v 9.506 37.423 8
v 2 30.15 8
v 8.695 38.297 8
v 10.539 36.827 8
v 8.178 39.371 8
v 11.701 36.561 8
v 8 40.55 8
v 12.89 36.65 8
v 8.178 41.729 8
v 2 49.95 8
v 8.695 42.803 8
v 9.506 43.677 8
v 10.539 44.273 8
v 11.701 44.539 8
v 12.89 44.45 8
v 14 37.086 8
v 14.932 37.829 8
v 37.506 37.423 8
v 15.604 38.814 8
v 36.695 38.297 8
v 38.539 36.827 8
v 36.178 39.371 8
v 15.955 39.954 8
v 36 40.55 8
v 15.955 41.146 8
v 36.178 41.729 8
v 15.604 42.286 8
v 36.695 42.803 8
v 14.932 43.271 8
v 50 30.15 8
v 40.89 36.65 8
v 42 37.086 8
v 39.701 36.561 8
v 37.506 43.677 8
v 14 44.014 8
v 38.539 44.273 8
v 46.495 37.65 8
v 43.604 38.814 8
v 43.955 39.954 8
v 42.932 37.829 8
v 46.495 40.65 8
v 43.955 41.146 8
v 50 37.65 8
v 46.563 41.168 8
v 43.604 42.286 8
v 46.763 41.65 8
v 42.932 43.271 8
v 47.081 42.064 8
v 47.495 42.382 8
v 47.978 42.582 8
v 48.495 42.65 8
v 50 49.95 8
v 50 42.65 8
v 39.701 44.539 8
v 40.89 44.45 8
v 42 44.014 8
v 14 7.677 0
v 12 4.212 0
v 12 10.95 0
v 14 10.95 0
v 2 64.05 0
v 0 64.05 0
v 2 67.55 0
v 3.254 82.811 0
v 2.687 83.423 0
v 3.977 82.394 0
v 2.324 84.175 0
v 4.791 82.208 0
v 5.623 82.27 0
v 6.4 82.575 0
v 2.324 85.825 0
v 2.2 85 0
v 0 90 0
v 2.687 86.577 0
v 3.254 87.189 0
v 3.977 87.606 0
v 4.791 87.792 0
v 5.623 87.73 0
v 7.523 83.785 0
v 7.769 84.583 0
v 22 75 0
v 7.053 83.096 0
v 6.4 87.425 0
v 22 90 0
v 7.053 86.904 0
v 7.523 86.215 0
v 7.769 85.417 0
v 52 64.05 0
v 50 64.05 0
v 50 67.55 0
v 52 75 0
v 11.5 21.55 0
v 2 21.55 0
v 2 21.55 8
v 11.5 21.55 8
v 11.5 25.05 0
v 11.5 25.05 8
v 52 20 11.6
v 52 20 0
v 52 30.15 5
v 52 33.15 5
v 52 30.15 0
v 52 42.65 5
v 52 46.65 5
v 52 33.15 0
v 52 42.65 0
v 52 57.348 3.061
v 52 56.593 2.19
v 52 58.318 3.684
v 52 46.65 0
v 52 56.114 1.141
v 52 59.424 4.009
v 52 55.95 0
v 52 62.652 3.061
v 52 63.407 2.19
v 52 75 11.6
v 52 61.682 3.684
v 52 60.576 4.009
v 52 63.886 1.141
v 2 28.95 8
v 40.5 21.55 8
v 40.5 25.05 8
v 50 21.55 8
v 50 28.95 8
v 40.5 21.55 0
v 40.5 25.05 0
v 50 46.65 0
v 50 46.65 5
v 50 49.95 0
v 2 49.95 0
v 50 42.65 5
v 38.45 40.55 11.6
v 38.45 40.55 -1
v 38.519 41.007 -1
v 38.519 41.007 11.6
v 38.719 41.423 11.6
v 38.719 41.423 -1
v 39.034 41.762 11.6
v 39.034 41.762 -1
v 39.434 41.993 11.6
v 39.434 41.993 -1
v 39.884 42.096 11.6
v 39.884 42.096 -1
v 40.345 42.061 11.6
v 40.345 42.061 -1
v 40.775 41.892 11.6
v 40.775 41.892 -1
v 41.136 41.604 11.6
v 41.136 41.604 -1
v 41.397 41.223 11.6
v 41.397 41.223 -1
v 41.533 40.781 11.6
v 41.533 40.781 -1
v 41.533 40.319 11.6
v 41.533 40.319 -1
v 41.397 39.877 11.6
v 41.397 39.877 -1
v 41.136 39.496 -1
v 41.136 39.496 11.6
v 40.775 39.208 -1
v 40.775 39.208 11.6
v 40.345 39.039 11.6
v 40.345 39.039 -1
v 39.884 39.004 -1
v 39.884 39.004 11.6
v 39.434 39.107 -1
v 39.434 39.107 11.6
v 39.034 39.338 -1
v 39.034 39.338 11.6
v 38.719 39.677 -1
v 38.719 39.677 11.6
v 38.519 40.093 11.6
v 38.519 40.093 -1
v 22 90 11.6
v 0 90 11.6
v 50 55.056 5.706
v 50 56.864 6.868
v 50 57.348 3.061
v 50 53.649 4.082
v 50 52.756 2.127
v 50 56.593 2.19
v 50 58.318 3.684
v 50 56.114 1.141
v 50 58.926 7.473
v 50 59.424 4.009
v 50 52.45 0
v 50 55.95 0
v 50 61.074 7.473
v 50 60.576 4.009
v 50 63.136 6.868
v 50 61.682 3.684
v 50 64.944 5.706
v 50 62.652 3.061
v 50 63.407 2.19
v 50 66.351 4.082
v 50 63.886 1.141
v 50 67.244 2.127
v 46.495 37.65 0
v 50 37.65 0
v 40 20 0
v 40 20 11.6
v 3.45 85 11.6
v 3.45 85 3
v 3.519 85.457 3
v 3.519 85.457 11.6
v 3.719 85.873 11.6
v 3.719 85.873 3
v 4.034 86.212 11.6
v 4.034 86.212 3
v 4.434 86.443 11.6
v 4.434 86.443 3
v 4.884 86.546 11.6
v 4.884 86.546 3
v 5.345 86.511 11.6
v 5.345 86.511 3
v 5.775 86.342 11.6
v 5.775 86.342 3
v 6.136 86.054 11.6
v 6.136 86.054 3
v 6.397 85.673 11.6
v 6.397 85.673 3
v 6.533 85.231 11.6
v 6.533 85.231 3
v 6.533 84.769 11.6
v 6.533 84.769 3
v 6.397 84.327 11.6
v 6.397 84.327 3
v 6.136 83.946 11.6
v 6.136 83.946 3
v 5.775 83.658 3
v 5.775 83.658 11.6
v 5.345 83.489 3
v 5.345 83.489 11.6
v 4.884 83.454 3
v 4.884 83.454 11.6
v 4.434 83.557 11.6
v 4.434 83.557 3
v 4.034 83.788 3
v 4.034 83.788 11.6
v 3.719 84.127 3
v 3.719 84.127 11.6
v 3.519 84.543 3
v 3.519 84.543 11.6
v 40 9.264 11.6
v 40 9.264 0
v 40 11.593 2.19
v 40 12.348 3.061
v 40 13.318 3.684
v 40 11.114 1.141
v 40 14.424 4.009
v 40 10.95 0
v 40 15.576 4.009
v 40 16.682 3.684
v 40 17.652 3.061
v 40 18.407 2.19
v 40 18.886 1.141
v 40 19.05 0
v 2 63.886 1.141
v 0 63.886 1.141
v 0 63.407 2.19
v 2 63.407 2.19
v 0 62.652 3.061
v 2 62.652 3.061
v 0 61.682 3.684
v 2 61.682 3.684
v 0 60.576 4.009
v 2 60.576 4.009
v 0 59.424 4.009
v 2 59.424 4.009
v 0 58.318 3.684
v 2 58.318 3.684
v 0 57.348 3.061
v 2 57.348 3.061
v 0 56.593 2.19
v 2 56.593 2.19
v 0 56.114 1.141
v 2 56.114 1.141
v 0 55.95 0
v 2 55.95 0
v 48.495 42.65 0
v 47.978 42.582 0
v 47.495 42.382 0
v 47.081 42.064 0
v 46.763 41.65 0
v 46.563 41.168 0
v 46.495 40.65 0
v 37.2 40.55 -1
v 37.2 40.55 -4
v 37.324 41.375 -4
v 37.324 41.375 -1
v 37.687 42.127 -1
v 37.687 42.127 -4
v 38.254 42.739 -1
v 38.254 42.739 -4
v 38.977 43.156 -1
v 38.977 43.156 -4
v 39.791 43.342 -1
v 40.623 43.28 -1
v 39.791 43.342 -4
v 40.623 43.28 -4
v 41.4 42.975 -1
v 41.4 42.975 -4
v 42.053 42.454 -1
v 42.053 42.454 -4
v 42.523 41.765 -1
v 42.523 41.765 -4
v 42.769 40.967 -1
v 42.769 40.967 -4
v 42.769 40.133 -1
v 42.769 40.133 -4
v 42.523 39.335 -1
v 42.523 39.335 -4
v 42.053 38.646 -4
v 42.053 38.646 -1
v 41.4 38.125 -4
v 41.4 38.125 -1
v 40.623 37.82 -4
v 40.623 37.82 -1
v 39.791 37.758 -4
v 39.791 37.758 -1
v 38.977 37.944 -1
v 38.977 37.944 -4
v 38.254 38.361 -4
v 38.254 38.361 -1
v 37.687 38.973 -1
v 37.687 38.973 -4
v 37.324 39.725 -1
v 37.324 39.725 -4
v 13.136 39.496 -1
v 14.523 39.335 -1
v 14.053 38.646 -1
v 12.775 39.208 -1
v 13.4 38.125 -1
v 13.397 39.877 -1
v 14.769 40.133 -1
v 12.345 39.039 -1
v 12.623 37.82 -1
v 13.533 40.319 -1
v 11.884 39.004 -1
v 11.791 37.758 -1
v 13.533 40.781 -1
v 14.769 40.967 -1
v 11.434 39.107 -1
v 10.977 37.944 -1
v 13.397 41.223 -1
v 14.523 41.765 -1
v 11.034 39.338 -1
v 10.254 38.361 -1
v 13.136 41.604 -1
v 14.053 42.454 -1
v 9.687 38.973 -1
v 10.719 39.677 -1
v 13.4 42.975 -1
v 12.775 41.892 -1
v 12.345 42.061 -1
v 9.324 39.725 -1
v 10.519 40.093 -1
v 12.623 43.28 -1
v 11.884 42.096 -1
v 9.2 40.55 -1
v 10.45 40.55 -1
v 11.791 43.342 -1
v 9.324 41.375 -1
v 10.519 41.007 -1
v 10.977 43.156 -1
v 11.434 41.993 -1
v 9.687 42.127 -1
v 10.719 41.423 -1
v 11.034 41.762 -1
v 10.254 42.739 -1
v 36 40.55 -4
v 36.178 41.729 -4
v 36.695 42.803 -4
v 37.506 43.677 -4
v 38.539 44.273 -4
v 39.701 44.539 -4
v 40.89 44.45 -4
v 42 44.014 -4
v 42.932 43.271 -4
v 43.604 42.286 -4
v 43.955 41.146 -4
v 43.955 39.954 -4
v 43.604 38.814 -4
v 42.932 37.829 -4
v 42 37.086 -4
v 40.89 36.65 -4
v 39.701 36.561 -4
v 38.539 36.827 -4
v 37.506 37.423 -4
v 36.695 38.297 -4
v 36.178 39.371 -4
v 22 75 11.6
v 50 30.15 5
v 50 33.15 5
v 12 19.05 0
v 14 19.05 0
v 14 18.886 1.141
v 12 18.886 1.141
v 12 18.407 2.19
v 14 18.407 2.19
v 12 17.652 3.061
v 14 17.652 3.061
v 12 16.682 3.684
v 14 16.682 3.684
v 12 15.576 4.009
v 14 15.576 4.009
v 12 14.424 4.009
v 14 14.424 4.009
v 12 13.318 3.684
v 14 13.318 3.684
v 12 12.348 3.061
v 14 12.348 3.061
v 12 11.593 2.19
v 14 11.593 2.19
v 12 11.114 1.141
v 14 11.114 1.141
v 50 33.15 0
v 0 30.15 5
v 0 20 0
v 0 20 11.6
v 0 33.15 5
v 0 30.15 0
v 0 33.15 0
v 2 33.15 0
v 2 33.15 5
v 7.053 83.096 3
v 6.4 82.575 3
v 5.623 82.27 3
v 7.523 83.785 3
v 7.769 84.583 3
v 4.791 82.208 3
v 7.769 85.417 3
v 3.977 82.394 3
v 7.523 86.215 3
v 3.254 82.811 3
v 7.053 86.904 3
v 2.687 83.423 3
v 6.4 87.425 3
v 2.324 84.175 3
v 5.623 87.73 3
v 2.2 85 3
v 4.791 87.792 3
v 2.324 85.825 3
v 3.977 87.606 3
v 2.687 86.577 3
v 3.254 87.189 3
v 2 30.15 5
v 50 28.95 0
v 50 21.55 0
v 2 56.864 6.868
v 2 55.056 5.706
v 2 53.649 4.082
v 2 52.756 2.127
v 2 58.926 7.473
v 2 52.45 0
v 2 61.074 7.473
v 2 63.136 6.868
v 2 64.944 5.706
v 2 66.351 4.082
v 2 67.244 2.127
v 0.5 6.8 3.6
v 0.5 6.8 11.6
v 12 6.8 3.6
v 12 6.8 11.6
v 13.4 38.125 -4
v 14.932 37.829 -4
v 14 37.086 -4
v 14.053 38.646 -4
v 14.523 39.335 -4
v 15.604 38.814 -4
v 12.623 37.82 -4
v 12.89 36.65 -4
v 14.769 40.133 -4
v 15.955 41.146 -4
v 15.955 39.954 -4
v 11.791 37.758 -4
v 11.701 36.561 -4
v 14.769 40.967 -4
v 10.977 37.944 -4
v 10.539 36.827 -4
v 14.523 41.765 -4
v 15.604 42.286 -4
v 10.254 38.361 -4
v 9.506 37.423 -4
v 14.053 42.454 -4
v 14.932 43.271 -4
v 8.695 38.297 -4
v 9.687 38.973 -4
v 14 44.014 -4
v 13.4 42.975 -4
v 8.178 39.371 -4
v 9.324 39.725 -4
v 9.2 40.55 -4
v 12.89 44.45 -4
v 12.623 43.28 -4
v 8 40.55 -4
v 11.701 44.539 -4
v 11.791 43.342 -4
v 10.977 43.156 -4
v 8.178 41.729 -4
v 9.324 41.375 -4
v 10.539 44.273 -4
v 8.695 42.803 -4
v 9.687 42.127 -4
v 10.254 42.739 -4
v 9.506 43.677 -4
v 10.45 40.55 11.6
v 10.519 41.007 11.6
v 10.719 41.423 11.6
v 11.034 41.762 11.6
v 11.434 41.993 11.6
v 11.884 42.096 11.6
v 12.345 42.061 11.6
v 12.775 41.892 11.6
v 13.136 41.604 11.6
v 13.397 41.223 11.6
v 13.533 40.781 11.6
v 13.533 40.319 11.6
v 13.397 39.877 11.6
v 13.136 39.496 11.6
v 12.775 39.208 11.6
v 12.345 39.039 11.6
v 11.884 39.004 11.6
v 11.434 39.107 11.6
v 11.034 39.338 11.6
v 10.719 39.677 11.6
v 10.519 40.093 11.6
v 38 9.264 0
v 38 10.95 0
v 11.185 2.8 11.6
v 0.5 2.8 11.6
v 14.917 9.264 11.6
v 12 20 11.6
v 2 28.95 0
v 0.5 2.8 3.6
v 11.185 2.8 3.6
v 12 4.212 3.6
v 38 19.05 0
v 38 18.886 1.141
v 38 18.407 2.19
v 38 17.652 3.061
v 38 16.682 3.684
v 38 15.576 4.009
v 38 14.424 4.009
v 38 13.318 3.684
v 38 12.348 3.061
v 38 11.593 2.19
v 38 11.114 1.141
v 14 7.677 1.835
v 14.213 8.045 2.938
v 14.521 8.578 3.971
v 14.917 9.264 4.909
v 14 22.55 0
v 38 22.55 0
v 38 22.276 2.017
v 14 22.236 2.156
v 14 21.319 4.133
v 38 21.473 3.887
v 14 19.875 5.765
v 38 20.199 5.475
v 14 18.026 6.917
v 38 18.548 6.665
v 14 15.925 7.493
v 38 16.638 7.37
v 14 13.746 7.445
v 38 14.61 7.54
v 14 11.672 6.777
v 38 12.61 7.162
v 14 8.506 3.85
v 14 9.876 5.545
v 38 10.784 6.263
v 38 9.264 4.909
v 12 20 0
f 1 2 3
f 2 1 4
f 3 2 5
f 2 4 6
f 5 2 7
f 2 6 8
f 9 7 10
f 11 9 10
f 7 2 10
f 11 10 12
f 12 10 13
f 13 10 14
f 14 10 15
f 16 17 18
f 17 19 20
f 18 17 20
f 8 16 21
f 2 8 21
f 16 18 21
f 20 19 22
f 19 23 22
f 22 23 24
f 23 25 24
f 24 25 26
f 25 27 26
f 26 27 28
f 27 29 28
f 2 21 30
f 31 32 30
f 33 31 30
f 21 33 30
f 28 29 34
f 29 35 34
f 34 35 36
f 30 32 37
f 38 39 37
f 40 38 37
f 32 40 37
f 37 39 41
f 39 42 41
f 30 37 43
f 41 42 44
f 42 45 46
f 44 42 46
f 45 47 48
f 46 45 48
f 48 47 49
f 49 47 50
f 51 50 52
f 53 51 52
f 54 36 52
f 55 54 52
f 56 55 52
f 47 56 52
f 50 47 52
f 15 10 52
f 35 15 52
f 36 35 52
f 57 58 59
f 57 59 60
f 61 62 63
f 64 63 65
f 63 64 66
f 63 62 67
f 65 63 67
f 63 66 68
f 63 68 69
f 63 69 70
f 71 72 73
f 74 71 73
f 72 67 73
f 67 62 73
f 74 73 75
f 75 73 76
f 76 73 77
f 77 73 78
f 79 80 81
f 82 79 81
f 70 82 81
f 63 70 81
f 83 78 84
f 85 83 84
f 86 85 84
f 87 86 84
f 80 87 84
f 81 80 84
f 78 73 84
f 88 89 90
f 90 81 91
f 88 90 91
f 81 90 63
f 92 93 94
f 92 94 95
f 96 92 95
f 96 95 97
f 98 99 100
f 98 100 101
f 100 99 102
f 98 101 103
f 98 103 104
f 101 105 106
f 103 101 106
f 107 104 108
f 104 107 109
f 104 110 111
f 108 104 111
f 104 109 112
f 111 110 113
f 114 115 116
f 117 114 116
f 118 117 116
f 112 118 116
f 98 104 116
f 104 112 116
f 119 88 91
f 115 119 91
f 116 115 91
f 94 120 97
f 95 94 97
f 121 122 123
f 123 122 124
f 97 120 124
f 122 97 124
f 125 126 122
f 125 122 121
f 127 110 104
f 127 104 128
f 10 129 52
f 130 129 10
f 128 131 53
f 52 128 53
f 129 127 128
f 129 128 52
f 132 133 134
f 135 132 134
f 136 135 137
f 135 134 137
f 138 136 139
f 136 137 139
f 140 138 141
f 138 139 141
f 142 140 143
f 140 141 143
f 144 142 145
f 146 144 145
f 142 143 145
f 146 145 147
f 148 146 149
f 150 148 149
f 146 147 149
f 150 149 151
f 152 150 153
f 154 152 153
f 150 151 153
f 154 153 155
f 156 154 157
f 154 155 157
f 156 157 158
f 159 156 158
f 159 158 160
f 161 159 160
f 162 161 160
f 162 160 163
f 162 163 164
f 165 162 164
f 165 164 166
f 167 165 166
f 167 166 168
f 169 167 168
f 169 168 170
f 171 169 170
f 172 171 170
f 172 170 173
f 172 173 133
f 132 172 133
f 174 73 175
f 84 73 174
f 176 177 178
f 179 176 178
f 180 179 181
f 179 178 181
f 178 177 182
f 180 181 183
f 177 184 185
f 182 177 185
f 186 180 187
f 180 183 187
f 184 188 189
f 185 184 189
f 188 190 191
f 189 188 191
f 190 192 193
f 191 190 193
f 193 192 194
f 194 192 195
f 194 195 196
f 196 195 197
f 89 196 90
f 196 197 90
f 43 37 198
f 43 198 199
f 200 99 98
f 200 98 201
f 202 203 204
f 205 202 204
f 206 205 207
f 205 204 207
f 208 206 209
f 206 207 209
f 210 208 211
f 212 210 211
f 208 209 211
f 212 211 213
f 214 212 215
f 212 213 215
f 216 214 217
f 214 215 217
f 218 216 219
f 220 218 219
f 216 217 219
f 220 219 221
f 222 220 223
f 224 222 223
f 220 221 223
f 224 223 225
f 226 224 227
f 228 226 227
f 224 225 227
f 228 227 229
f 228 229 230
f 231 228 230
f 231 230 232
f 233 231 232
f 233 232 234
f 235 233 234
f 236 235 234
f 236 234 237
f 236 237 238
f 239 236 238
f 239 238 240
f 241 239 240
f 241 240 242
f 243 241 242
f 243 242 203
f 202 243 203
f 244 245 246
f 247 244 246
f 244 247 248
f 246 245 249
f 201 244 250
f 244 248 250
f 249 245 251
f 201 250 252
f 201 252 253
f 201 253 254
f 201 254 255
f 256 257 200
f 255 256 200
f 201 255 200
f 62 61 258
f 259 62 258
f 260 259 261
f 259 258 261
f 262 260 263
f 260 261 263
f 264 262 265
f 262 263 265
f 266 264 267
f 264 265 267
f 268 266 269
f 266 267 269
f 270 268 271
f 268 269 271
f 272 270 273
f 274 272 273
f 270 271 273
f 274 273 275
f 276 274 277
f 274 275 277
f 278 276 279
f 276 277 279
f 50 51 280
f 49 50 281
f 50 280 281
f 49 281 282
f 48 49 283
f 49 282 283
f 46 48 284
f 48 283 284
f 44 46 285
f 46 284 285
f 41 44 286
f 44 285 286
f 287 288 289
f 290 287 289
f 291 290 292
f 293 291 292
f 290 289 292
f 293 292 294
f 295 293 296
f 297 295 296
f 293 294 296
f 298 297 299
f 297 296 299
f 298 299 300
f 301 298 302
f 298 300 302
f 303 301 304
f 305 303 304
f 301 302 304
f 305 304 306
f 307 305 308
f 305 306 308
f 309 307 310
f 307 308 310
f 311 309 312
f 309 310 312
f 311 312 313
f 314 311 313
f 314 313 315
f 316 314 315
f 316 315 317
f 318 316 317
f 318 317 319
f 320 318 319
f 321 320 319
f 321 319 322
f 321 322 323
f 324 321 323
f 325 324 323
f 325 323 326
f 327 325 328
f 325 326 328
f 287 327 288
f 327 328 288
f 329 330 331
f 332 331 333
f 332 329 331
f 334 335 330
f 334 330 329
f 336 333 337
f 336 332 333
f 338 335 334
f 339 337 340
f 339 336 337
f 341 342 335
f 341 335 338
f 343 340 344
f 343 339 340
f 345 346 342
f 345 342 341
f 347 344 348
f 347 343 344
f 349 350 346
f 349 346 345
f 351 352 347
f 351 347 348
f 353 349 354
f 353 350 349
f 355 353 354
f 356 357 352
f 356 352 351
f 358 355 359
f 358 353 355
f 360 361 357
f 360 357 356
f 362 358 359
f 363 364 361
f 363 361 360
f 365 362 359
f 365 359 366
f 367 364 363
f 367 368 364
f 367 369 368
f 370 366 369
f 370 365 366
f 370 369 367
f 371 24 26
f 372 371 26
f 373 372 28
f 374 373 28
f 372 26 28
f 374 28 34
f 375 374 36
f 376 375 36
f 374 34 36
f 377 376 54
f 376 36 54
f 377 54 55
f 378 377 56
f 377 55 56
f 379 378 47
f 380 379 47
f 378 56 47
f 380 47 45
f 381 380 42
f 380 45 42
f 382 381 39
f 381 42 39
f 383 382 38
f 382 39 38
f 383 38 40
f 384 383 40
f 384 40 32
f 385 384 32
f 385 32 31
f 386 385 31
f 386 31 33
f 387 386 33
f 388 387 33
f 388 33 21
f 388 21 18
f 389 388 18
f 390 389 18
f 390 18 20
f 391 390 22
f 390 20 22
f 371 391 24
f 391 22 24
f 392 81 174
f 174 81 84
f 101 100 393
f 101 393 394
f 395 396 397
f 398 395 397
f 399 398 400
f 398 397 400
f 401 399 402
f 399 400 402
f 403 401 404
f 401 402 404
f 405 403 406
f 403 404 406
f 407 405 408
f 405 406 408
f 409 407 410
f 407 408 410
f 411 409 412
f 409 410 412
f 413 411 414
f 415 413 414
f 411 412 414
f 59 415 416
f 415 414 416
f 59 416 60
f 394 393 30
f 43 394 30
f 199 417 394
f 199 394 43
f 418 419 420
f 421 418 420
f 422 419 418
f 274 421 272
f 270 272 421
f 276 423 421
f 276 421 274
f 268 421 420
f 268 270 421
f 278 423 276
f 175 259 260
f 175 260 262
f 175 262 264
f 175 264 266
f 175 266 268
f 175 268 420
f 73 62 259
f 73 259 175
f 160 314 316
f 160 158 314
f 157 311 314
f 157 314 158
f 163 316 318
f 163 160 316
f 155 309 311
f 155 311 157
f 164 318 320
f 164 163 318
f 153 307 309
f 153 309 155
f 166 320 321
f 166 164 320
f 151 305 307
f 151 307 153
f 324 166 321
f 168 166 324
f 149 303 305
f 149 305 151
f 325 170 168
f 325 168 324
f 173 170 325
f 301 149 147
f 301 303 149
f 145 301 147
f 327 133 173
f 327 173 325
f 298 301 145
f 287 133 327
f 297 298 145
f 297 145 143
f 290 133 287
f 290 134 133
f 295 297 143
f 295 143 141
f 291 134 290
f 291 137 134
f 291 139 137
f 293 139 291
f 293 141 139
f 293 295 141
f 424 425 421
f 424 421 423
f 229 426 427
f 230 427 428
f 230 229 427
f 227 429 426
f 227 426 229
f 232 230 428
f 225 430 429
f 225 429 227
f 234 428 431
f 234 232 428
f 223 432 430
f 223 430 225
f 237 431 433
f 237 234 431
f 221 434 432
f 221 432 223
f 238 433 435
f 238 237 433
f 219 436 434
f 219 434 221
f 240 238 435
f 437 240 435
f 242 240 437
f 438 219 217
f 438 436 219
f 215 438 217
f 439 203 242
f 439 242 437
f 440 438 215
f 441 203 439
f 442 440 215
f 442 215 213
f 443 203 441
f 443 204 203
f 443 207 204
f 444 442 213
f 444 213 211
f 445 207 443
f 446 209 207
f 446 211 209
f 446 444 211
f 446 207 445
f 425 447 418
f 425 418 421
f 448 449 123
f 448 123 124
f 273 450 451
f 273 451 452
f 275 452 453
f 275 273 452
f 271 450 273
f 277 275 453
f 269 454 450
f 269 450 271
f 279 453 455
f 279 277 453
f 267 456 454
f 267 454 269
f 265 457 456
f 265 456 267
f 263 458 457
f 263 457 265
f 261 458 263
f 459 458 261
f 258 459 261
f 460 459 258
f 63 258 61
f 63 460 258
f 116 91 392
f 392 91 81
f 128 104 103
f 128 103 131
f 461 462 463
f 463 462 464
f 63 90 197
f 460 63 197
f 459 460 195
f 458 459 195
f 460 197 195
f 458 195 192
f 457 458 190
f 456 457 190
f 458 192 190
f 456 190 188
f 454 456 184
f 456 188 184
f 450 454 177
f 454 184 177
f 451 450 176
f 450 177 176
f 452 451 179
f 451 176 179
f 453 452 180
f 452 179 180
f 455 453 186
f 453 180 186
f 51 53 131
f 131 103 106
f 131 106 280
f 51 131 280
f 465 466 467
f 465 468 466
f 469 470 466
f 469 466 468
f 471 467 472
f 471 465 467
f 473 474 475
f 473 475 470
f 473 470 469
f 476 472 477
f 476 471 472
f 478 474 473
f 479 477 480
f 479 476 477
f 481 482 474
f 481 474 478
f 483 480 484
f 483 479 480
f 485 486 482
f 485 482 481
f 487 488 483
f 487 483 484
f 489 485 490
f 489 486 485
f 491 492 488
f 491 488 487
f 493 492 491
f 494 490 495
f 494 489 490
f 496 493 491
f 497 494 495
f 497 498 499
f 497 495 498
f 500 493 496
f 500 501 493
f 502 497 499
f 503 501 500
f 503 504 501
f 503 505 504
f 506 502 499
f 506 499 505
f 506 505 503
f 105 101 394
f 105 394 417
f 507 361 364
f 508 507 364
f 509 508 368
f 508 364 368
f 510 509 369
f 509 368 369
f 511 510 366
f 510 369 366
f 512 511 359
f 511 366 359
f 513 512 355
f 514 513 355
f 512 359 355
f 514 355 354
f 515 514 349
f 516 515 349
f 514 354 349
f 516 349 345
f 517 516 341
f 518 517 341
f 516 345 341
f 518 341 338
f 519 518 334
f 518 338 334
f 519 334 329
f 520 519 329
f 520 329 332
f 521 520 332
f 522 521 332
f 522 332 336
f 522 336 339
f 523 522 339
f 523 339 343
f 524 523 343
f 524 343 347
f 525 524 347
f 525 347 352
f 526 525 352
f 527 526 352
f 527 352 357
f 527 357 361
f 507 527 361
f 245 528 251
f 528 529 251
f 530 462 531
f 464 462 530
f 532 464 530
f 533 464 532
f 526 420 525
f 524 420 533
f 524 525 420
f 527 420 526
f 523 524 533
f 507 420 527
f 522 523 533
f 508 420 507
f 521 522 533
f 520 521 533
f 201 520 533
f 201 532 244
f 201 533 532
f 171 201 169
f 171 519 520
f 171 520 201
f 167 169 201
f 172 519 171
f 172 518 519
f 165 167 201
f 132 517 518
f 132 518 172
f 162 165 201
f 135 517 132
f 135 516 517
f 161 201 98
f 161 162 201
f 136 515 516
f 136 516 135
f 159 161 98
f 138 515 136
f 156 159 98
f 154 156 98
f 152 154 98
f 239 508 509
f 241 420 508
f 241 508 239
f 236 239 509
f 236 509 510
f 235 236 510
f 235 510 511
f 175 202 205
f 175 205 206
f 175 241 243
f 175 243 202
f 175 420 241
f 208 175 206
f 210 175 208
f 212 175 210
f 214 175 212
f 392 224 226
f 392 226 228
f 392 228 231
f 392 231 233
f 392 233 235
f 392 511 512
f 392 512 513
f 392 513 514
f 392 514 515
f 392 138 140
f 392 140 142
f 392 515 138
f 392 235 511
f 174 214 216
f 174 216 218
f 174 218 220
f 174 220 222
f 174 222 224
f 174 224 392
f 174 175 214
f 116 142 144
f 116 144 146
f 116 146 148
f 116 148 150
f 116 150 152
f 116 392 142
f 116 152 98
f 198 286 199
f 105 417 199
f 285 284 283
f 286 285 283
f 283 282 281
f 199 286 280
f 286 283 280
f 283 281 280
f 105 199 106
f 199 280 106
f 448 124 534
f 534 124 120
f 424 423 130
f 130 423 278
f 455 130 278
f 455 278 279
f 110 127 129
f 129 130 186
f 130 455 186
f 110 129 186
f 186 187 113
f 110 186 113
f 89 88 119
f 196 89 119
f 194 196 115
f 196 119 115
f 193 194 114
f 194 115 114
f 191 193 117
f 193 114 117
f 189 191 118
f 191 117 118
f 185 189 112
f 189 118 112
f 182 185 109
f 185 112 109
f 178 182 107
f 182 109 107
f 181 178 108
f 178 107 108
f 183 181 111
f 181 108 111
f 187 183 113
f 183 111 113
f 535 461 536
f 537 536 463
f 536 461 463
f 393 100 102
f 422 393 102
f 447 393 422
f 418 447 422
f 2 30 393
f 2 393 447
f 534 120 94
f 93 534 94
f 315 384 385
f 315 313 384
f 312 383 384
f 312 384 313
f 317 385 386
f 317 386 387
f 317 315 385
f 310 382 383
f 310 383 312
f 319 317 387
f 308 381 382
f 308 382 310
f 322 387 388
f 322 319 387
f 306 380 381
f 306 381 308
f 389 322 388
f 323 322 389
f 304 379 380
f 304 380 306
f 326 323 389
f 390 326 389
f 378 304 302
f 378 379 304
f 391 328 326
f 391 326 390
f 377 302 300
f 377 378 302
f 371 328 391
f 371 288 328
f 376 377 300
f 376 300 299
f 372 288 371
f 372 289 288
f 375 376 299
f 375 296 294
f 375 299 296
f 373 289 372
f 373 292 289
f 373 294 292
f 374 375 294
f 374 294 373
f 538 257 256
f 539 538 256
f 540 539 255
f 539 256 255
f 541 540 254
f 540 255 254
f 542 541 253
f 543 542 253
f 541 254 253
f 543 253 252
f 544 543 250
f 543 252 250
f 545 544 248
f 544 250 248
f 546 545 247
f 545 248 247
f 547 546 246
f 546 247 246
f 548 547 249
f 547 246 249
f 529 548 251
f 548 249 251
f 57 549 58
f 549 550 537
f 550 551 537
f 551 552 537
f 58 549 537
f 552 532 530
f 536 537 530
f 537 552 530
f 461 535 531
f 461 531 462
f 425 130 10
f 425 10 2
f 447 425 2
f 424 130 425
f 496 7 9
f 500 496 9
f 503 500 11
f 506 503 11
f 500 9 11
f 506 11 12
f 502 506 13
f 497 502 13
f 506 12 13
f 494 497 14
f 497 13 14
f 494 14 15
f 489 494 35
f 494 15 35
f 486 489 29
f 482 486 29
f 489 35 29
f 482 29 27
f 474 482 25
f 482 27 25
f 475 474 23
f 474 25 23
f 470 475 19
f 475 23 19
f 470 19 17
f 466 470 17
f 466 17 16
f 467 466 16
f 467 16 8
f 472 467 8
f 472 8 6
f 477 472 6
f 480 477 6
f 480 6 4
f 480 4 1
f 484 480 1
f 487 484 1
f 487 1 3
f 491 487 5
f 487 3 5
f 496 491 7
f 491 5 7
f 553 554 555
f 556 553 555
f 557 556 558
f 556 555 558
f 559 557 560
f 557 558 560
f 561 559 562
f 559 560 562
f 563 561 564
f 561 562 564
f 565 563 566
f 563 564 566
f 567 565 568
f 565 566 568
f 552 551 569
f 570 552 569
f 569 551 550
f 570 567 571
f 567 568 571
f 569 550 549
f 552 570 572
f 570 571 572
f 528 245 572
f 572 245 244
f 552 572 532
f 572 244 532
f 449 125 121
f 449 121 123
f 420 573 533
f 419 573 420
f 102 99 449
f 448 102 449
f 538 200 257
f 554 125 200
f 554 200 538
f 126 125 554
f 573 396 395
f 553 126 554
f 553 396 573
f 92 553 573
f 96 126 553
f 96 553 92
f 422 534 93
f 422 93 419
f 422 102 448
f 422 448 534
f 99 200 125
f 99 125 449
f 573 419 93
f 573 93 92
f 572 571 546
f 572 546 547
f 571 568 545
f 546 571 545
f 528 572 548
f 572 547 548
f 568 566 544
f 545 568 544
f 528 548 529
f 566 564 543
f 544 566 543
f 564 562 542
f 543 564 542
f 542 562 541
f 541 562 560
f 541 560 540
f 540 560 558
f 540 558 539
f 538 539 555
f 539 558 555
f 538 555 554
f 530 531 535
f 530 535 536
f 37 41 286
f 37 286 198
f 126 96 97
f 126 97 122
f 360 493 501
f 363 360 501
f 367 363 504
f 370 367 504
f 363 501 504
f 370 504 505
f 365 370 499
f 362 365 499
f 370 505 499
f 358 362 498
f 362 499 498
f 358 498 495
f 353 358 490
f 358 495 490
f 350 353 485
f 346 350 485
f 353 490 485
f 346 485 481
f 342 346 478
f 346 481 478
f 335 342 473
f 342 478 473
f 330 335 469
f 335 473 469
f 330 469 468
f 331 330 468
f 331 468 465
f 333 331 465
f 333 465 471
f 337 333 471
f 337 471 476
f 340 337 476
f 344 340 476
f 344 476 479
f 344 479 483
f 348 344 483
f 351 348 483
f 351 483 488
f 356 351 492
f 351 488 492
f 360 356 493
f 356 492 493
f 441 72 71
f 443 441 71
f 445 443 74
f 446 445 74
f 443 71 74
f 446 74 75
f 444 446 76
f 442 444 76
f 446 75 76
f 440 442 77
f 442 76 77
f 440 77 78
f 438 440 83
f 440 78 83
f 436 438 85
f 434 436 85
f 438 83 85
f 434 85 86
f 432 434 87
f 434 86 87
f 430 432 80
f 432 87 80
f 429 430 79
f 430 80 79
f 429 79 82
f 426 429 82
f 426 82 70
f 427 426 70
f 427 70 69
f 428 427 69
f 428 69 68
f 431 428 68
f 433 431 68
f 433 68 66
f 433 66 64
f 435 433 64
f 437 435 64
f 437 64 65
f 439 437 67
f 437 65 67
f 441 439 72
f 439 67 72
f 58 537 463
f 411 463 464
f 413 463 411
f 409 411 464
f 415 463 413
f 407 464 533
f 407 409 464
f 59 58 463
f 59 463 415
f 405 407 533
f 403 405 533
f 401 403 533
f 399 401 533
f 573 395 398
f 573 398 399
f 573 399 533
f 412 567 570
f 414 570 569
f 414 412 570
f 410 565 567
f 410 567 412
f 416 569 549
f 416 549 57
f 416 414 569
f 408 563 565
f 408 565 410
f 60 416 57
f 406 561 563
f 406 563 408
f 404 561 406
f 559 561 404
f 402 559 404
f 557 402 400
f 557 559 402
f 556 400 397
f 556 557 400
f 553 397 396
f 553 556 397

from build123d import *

# Parameters (mm, degrees)
CROQUIS1_W              = 52
CROQUIS1_H              = 90
SALIENTE_EXTRUIR1_DEPTH = 11.6
CORTAR_EXTRUIR1_DEPTH   = 48
CORTAR_EXTRUIR2_DEPTH   = 24
CORTAR_EXTRUIR3_DEPTH   = 53
CORTAR_EXTRUIR4_DEPTH   = 53
CORTAR_EXTRUIR7_DEPTH   = 8
CROQUIS7_R              = 4
SALIENTE_EXTRUIR2_DEPTH = 12
CROQUIS8_W              = 2
CROQUIS8_H              = 4
CORTAR_EXTRUIR8_DEPTH   = 5
SALIENTE_EXTRUIR4_DEPTH = 8
CROQUIS10_R             = 1.55
CORTAR_EXTRUIR9_DEPTH   = 16.6
CROQUIS11_R             = 2.8
CROQUIS11_R_2           = 1.55
CORTAR_EXTRUIR10_DEPTH  = 3
CROQUIS12_W             = 5
CROQUIS12_H             = 3
CORTAR_EXTRUIR11_DEPTH  = 53
CROQUIS13_W             = 30
CROQUIS13_H             = 15
CORTAR_EXTRUIR12_DEPTH  = 12
CROQUIS14_R             = 1.55
CORTAR_EXTRUIR13_DEPTH  = 12
CROQUIS14_3_R           = 2.8
CROQUIS14_3_R_2         = 1.55
CORTAR_EXTRUIR14_DEPTH  = 3
CROQUIS15_W             = 48
CROQUIS15_H             = 1.2
SALIENTE_EXTRUIR5_DEPTH = 8
CROQUIS16_W             = 12
CROQUIS16_H             = 20
CORTAR_EXTRUIR15_DEPTH  = 12.6
CROQUIS17_W             = 12
CROQUIS17_H             = 20
CORTAR_EXTRUIR16_DEPTH  = 12.6
CROQUIS18_W             = 11.5
CROQUIS18_H             = 4
SALIENTE_EXTRUIR6_DEPTH = 8
CROQUIS19_R             = 4
SALIENTE_EXTRUIR7_DEPTH = 12
CROQUIS20_R             = 1.55
CORTAR_EXTRUIR17_DEPTH  = 16.6
CROQUIS20_3_R           = 2.8
CROQUIS20_3_R_2         = 1.55
CORTAR_EXTRUIR18_DEPTH  = 3
CROQUIS21_W             = 28
CROQUIS21_H             = 2.8
CORTAR_EXTRUIR19_DEPTH  = 16.6
CORTAR_EXTRUIR20_DEPTH  = 16.6


with BuildPart() as part:
    # Croquis1 → Saliente-Extruir1 (new body)
    with BuildSketch(Plane.XY):
        with Locations((26, 45)):
            Rectangle(CROQUIS1_W, CROQUIS1_H)
    extrude(amount=SALIENTE_EXTRUIR1_DEPTH)

    # Croquis2 → Cortar-Extruir1 (cut)
    with BuildSketch(Plane(origin=(50, 0, 0), x_dir=(0, 0, -1), z_dir=(1, 0, 0))):
        with BuildLine():
            Line((0, 52.45), (0, 67.55))
            ThreePointArc((0, 67.55), (-7.55, 60), (0, 52.45))
        make_face()
    extrude(amount=-CORTAR_EXTRUIR1_DEPTH, mode=Mode.SUBTRACT)

    # Croquis3 → Cortar-Extruir2 (cut)
    with BuildSketch(Plane(origin=(38, 0, 0), x_dir=(0, 0, -1), z_dir=(1, 0, 0))):
        with BuildLine():
            Line((0, 7.45), (0, 22.55))
            ThreePointArc((0, 22.55), (-7.55, 15), (0, 7.45))
        make_face()
    extrude(amount=-CORTAR_EXTRUIR2_DEPTH, mode=Mode.SUBTRACT)

    # Croquis4 → Cortar-Extruir3 (cut, through all)
    with BuildSketch(Plane(origin=(52, 0, 0), x_dir=(0, 0, -1), z_dir=(1, 0, 0))):
        with BuildLine():
            ThreePointArc((0, 64.05), (-4.05, 60), (0, 55.95))
            Line((0, 55.95), (0, 64.05))
        make_face()
        with BuildLine():
            Line((0, 64.05), (0, 55.95))
            ThreePointArc((0, 55.95), (2.863782464, 57.136217536), (4.05, 60))
            ThreePointArc((4.05, 60), (2.863782464, 62.863782464), (0, 64.05))
        make_face()
    extrude(amount=-CORTAR_EXTRUIR3_DEPTH, mode=Mode.SUBTRACT)

    # Croquis5 → Cortar-Extruir4 (cut, through all)
    with BuildSketch(Plane(origin=(52, 0, 0), x_dir=(0, 0, -1), z_dir=(1, 0, 0))):
        with BuildLine():
            ThreePointArc((0, 19.05), (-4.05, 15), (0, 10.95))
            Line((0, 10.95), (0, 19.05))
        make_face()
        with BuildLine():
            Line((0, 19.05), (0, 10.95))
            ThreePointArc((0, 10.95), (2.863782464, 12.136217536), (4.05, 15))
            ThreePointArc((4.05, 15), (2.863782464, 17.863782464), (0, 19.05))
        make_face()
    extrude(amount=-CORTAR_EXTRUIR4_DEPTH, mode=Mode.SUBTRACT)

    # Croquis6 → Cortar-Extruir7 (cut)
    with BuildSketch(Plane(origin=(0, 0, 0), x_dir=(-1, 0, 0), z_dir=(0, 0, -1))):
        Polygon((-2, 49.95), (-2, 21.55), (-11.5, 21.55), (-11.5, 25.05), (-40.5, 25.05), (-40.5, 21.55), (-50, 21.55), (-50, 49.95), align=None)
    extrude(amount=-CORTAR_EXTRUIR7_DEPTH, mode=Mode.SUBTRACT)

    # Croquis7 → Saliente-Extruir2 (add)
    with BuildSketch(Plane(origin=(0, 0, 8), x_dir=(-1, 0, 0), z_dir=(0, 0, -1))):
        with Locations((-40, 40.55)):
            Circle(CROQUIS7_R)
    extrude(amount=SALIENTE_EXTRUIR2_DEPTH)

    # Croquis8 → Cortar-Extruir8 (cut)
    with BuildSketch(Plane(origin=(0, 0, 0), x_dir=(-1, 0, 0), z_dir=(0, 0, -1))):
        with Locations((-51, 44.65)):
            Rectangle(CROQUIS8_W, CROQUIS8_H)
    extrude(amount=-CORTAR_EXTRUIR8_DEPTH, mode=Mode.SUBTRACT)

    # Croquis9 → Saliente-Extruir4 (add)
    with BuildSketch(Plane(origin=(0, 0, 0), x_dir=(-1, 0, 0), z_dir=(0, 0, -1))):
        with BuildLine():
            Line((-52, 42.65), (-48.495265185, 42.65))
            ThreePointArc((-48.495265185, 42.65), (-47.081051623, 42.064213562), (-46.495265185, 40.65))
            Line((-46.495265185, 40.65), (-46.495265185, 37.65))
            Line((-46.495265185, 37.65), (-52, 37.65))
            Line((-52, 37.65), (-52, 42.65))
        make_face()
    extrude(amount=-SALIENTE_EXTRUIR4_DEPTH)

    # Croquis10 → Cortar-Extruir9 (cut, through all)
    with BuildSketch(Plane(origin=(0, 0, -4), x_dir=(-1, 0, 0), z_dir=(0, 0, -1))):
        with Locations((-40, 40.55)):
            Circle(CROQUIS10_R)
    extrude(amount=-CORTAR_EXTRUIR9_DEPTH, mode=Mode.SUBTRACT)

    # Croquis11 → Cortar-Extruir10 (cut)
    with BuildSketch(Plane(origin=(0, 0, -4), x_dir=(-1, 0, 0), z_dir=(0, 0, -1))):
        with Locations((-40, 40.55)):
            Circle(CROQUIS11_R)
        with Locations((-40, 40.55)):
            Circle(CROQUIS11_R_2, mode=Mode.SUBTRACT)
    extrude(amount=-CORTAR_EXTRUIR10_DEPTH, mode=Mode.SUBTRACT)

    # Croquis12 → Cortar-Extruir11 (cut, through all)
    with BuildSketch(Plane(origin=(52, 0, 0), x_dir=(0, 0, -1), z_dir=(1, 0, 0))):
        with Locations((-2.5, 31.65)):
            Rectangle(CROQUIS12_W, CROQUIS12_H)
    extrude(amount=-CORTAR_EXTRUIR11_DEPTH, mode=Mode.SUBTRACT)

    # Croquis13 → Cortar-Extruir12 (cut)
    with BuildSketch(Plane(origin=(0, 0, 0), x_dir=(-1, 0, 0), z_dir=(0, 0, -1))):
        with Locations((-37, 82.5)):
            Rectangle(CROQUIS13_W, CROQUIS13_H)
    extrude(amount=-CORTAR_EXTRUIR12_DEPTH, mode=Mode.SUBTRACT)

    # Croquis14 → Cortar-Extruir13 (cut)
    with BuildSketch(Plane(origin=(0, 0, 0), x_dir=(-1, 0, 0), z_dir=(0, 0, -1))):
        with Locations((-5, 85)):
            Circle(CROQUIS14_R)
    extrude(amount=-CORTAR_EXTRUIR13_DEPTH, mode=Mode.SUBTRACT)

    # Croquis14<3> → Cortar-Extruir14 (cut)
    with BuildSketch(Plane(origin=(0, 0, 0), x_dir=(-1, 0, 0), z_dir=(0, 0, -1))):
        with Locations((-5, 85)):
            Circle(CROQUIS14_3_R)
        with Locations((-5, 85)):
            Circle(CROQUIS14_3_R_2, mode=Mode.SUBTRACT)
    extrude(amount=-CORTAR_EXTRUIR14_DEPTH, mode=Mode.SUBTRACT)

    # Croquis15 → Saliente-Extruir5 (add)
    with BuildSketch(Plane(origin=(0, 0, 8), x_dir=(-1, 0, 0), z_dir=(0, 0, -1))):
        with Locations((-26, 29.55)):
            Rectangle(CROQUIS15_W, CROQUIS15_H)
    extrude(amount=SALIENTE_EXTRUIR5_DEPTH)

    # Croquis16 → Cortar-Extruir15 (cut, through all)
    with BuildSketch(Plane(origin=(0, 0, 0), x_dir=(-1, 0, 0), z_dir=(0, 0, -1))):
        with Locations((-46, 10)):
            Rectangle(CROQUIS16_W, CROQUIS16_H)
    extrude(amount=-CORTAR_EXTRUIR15_DEPTH, mode=Mode.SUBTRACT)

    # Croquis17 → Cortar-Extruir16 (cut, through all)
    with BuildSketch(Plane(origin=(0, 0, 0), x_dir=(-1, 0, 0), z_dir=(0, 0, -1))):
        with Locations((-6, 10)):
            Rectangle(CROQUIS17_W, CROQUIS17_H)
    extrude(amount=-CORTAR_EXTRUIR16_DEPTH, mode=Mode.SUBTRACT)

    # Croquis18 → Saliente-Extruir6 (add)
    with BuildSketch(Plane.XY.offset(11.6)):
        with Locations((6.25, 4.8)):
            Rectangle(CROQUIS18_W, CROQUIS18_H)
    extrude(amount=-SALIENTE_EXTRUIR6_DEPTH)

    # Croquis19 → Saliente-Extruir7 (add)
    with BuildSketch(Plane(origin=(0, 0, 8), x_dir=(-1, 0, 0), z_dir=(0, 0, -1))):
        with Locations((-12, 40.55)):
            Circle(CROQUIS19_R)
    extrude(amount=SALIENTE_EXTRUIR7_DEPTH)

    # Croquis20 → Cortar-Extruir17 (cut, through all)
    with BuildSketch(Plane(origin=(0, 0, -4), x_dir=(-1, 0, 0), z_dir=(0, 0, -1))):
        with Locations((-12, 40.55)):
            Circle(CROQUIS20_R)
    extrude(amount=-CORTAR_EXTRUIR17_DEPTH, mode=Mode.SUBTRACT)

    # Croquis20<3> → Cortar-Extruir18 (cut)
    with BuildSketch(Plane(origin=(0, 0, -4), x_dir=(-1, 0, 0), z_dir=(0, 0, -1))):
        with Locations((-12, 40.55)):
            Circle(CROQUIS20_3_R)
        with Locations((-12, 40.55)):
            Circle(CROQUIS20_3_R_2, mode=Mode.SUBTRACT)
    extrude(amount=-CORTAR_EXTRUIR18_DEPTH, mode=Mode.SUBTRACT)

    # Croquis21 → Cortar-Extruir19 (cut, through all)
    with BuildSketch(Plane.XY.offset(11.6)):
        with Locations((26, 1.4)):
            Rectangle(CROQUIS21_W, CROQUIS21_H)
    extrude(amount=-CORTAR_EXTRUIR19_DEPTH, mode=Mode.SUBTRACT)

    # Croquis22 → Cortar-Extruir20 (cut, through all)
    with BuildSketch(Plane.XY.offset(11.6)):
        Polygon((11.184549083, 2.8), (40, 2.8), (40, 9.264101615), (14.916599891, 9.264101615), align=None)
    extrude(amount=-CORTAR_EXTRUIR20_DEPTH, mode=Mode.SUBTRACT)


solid = part.part
